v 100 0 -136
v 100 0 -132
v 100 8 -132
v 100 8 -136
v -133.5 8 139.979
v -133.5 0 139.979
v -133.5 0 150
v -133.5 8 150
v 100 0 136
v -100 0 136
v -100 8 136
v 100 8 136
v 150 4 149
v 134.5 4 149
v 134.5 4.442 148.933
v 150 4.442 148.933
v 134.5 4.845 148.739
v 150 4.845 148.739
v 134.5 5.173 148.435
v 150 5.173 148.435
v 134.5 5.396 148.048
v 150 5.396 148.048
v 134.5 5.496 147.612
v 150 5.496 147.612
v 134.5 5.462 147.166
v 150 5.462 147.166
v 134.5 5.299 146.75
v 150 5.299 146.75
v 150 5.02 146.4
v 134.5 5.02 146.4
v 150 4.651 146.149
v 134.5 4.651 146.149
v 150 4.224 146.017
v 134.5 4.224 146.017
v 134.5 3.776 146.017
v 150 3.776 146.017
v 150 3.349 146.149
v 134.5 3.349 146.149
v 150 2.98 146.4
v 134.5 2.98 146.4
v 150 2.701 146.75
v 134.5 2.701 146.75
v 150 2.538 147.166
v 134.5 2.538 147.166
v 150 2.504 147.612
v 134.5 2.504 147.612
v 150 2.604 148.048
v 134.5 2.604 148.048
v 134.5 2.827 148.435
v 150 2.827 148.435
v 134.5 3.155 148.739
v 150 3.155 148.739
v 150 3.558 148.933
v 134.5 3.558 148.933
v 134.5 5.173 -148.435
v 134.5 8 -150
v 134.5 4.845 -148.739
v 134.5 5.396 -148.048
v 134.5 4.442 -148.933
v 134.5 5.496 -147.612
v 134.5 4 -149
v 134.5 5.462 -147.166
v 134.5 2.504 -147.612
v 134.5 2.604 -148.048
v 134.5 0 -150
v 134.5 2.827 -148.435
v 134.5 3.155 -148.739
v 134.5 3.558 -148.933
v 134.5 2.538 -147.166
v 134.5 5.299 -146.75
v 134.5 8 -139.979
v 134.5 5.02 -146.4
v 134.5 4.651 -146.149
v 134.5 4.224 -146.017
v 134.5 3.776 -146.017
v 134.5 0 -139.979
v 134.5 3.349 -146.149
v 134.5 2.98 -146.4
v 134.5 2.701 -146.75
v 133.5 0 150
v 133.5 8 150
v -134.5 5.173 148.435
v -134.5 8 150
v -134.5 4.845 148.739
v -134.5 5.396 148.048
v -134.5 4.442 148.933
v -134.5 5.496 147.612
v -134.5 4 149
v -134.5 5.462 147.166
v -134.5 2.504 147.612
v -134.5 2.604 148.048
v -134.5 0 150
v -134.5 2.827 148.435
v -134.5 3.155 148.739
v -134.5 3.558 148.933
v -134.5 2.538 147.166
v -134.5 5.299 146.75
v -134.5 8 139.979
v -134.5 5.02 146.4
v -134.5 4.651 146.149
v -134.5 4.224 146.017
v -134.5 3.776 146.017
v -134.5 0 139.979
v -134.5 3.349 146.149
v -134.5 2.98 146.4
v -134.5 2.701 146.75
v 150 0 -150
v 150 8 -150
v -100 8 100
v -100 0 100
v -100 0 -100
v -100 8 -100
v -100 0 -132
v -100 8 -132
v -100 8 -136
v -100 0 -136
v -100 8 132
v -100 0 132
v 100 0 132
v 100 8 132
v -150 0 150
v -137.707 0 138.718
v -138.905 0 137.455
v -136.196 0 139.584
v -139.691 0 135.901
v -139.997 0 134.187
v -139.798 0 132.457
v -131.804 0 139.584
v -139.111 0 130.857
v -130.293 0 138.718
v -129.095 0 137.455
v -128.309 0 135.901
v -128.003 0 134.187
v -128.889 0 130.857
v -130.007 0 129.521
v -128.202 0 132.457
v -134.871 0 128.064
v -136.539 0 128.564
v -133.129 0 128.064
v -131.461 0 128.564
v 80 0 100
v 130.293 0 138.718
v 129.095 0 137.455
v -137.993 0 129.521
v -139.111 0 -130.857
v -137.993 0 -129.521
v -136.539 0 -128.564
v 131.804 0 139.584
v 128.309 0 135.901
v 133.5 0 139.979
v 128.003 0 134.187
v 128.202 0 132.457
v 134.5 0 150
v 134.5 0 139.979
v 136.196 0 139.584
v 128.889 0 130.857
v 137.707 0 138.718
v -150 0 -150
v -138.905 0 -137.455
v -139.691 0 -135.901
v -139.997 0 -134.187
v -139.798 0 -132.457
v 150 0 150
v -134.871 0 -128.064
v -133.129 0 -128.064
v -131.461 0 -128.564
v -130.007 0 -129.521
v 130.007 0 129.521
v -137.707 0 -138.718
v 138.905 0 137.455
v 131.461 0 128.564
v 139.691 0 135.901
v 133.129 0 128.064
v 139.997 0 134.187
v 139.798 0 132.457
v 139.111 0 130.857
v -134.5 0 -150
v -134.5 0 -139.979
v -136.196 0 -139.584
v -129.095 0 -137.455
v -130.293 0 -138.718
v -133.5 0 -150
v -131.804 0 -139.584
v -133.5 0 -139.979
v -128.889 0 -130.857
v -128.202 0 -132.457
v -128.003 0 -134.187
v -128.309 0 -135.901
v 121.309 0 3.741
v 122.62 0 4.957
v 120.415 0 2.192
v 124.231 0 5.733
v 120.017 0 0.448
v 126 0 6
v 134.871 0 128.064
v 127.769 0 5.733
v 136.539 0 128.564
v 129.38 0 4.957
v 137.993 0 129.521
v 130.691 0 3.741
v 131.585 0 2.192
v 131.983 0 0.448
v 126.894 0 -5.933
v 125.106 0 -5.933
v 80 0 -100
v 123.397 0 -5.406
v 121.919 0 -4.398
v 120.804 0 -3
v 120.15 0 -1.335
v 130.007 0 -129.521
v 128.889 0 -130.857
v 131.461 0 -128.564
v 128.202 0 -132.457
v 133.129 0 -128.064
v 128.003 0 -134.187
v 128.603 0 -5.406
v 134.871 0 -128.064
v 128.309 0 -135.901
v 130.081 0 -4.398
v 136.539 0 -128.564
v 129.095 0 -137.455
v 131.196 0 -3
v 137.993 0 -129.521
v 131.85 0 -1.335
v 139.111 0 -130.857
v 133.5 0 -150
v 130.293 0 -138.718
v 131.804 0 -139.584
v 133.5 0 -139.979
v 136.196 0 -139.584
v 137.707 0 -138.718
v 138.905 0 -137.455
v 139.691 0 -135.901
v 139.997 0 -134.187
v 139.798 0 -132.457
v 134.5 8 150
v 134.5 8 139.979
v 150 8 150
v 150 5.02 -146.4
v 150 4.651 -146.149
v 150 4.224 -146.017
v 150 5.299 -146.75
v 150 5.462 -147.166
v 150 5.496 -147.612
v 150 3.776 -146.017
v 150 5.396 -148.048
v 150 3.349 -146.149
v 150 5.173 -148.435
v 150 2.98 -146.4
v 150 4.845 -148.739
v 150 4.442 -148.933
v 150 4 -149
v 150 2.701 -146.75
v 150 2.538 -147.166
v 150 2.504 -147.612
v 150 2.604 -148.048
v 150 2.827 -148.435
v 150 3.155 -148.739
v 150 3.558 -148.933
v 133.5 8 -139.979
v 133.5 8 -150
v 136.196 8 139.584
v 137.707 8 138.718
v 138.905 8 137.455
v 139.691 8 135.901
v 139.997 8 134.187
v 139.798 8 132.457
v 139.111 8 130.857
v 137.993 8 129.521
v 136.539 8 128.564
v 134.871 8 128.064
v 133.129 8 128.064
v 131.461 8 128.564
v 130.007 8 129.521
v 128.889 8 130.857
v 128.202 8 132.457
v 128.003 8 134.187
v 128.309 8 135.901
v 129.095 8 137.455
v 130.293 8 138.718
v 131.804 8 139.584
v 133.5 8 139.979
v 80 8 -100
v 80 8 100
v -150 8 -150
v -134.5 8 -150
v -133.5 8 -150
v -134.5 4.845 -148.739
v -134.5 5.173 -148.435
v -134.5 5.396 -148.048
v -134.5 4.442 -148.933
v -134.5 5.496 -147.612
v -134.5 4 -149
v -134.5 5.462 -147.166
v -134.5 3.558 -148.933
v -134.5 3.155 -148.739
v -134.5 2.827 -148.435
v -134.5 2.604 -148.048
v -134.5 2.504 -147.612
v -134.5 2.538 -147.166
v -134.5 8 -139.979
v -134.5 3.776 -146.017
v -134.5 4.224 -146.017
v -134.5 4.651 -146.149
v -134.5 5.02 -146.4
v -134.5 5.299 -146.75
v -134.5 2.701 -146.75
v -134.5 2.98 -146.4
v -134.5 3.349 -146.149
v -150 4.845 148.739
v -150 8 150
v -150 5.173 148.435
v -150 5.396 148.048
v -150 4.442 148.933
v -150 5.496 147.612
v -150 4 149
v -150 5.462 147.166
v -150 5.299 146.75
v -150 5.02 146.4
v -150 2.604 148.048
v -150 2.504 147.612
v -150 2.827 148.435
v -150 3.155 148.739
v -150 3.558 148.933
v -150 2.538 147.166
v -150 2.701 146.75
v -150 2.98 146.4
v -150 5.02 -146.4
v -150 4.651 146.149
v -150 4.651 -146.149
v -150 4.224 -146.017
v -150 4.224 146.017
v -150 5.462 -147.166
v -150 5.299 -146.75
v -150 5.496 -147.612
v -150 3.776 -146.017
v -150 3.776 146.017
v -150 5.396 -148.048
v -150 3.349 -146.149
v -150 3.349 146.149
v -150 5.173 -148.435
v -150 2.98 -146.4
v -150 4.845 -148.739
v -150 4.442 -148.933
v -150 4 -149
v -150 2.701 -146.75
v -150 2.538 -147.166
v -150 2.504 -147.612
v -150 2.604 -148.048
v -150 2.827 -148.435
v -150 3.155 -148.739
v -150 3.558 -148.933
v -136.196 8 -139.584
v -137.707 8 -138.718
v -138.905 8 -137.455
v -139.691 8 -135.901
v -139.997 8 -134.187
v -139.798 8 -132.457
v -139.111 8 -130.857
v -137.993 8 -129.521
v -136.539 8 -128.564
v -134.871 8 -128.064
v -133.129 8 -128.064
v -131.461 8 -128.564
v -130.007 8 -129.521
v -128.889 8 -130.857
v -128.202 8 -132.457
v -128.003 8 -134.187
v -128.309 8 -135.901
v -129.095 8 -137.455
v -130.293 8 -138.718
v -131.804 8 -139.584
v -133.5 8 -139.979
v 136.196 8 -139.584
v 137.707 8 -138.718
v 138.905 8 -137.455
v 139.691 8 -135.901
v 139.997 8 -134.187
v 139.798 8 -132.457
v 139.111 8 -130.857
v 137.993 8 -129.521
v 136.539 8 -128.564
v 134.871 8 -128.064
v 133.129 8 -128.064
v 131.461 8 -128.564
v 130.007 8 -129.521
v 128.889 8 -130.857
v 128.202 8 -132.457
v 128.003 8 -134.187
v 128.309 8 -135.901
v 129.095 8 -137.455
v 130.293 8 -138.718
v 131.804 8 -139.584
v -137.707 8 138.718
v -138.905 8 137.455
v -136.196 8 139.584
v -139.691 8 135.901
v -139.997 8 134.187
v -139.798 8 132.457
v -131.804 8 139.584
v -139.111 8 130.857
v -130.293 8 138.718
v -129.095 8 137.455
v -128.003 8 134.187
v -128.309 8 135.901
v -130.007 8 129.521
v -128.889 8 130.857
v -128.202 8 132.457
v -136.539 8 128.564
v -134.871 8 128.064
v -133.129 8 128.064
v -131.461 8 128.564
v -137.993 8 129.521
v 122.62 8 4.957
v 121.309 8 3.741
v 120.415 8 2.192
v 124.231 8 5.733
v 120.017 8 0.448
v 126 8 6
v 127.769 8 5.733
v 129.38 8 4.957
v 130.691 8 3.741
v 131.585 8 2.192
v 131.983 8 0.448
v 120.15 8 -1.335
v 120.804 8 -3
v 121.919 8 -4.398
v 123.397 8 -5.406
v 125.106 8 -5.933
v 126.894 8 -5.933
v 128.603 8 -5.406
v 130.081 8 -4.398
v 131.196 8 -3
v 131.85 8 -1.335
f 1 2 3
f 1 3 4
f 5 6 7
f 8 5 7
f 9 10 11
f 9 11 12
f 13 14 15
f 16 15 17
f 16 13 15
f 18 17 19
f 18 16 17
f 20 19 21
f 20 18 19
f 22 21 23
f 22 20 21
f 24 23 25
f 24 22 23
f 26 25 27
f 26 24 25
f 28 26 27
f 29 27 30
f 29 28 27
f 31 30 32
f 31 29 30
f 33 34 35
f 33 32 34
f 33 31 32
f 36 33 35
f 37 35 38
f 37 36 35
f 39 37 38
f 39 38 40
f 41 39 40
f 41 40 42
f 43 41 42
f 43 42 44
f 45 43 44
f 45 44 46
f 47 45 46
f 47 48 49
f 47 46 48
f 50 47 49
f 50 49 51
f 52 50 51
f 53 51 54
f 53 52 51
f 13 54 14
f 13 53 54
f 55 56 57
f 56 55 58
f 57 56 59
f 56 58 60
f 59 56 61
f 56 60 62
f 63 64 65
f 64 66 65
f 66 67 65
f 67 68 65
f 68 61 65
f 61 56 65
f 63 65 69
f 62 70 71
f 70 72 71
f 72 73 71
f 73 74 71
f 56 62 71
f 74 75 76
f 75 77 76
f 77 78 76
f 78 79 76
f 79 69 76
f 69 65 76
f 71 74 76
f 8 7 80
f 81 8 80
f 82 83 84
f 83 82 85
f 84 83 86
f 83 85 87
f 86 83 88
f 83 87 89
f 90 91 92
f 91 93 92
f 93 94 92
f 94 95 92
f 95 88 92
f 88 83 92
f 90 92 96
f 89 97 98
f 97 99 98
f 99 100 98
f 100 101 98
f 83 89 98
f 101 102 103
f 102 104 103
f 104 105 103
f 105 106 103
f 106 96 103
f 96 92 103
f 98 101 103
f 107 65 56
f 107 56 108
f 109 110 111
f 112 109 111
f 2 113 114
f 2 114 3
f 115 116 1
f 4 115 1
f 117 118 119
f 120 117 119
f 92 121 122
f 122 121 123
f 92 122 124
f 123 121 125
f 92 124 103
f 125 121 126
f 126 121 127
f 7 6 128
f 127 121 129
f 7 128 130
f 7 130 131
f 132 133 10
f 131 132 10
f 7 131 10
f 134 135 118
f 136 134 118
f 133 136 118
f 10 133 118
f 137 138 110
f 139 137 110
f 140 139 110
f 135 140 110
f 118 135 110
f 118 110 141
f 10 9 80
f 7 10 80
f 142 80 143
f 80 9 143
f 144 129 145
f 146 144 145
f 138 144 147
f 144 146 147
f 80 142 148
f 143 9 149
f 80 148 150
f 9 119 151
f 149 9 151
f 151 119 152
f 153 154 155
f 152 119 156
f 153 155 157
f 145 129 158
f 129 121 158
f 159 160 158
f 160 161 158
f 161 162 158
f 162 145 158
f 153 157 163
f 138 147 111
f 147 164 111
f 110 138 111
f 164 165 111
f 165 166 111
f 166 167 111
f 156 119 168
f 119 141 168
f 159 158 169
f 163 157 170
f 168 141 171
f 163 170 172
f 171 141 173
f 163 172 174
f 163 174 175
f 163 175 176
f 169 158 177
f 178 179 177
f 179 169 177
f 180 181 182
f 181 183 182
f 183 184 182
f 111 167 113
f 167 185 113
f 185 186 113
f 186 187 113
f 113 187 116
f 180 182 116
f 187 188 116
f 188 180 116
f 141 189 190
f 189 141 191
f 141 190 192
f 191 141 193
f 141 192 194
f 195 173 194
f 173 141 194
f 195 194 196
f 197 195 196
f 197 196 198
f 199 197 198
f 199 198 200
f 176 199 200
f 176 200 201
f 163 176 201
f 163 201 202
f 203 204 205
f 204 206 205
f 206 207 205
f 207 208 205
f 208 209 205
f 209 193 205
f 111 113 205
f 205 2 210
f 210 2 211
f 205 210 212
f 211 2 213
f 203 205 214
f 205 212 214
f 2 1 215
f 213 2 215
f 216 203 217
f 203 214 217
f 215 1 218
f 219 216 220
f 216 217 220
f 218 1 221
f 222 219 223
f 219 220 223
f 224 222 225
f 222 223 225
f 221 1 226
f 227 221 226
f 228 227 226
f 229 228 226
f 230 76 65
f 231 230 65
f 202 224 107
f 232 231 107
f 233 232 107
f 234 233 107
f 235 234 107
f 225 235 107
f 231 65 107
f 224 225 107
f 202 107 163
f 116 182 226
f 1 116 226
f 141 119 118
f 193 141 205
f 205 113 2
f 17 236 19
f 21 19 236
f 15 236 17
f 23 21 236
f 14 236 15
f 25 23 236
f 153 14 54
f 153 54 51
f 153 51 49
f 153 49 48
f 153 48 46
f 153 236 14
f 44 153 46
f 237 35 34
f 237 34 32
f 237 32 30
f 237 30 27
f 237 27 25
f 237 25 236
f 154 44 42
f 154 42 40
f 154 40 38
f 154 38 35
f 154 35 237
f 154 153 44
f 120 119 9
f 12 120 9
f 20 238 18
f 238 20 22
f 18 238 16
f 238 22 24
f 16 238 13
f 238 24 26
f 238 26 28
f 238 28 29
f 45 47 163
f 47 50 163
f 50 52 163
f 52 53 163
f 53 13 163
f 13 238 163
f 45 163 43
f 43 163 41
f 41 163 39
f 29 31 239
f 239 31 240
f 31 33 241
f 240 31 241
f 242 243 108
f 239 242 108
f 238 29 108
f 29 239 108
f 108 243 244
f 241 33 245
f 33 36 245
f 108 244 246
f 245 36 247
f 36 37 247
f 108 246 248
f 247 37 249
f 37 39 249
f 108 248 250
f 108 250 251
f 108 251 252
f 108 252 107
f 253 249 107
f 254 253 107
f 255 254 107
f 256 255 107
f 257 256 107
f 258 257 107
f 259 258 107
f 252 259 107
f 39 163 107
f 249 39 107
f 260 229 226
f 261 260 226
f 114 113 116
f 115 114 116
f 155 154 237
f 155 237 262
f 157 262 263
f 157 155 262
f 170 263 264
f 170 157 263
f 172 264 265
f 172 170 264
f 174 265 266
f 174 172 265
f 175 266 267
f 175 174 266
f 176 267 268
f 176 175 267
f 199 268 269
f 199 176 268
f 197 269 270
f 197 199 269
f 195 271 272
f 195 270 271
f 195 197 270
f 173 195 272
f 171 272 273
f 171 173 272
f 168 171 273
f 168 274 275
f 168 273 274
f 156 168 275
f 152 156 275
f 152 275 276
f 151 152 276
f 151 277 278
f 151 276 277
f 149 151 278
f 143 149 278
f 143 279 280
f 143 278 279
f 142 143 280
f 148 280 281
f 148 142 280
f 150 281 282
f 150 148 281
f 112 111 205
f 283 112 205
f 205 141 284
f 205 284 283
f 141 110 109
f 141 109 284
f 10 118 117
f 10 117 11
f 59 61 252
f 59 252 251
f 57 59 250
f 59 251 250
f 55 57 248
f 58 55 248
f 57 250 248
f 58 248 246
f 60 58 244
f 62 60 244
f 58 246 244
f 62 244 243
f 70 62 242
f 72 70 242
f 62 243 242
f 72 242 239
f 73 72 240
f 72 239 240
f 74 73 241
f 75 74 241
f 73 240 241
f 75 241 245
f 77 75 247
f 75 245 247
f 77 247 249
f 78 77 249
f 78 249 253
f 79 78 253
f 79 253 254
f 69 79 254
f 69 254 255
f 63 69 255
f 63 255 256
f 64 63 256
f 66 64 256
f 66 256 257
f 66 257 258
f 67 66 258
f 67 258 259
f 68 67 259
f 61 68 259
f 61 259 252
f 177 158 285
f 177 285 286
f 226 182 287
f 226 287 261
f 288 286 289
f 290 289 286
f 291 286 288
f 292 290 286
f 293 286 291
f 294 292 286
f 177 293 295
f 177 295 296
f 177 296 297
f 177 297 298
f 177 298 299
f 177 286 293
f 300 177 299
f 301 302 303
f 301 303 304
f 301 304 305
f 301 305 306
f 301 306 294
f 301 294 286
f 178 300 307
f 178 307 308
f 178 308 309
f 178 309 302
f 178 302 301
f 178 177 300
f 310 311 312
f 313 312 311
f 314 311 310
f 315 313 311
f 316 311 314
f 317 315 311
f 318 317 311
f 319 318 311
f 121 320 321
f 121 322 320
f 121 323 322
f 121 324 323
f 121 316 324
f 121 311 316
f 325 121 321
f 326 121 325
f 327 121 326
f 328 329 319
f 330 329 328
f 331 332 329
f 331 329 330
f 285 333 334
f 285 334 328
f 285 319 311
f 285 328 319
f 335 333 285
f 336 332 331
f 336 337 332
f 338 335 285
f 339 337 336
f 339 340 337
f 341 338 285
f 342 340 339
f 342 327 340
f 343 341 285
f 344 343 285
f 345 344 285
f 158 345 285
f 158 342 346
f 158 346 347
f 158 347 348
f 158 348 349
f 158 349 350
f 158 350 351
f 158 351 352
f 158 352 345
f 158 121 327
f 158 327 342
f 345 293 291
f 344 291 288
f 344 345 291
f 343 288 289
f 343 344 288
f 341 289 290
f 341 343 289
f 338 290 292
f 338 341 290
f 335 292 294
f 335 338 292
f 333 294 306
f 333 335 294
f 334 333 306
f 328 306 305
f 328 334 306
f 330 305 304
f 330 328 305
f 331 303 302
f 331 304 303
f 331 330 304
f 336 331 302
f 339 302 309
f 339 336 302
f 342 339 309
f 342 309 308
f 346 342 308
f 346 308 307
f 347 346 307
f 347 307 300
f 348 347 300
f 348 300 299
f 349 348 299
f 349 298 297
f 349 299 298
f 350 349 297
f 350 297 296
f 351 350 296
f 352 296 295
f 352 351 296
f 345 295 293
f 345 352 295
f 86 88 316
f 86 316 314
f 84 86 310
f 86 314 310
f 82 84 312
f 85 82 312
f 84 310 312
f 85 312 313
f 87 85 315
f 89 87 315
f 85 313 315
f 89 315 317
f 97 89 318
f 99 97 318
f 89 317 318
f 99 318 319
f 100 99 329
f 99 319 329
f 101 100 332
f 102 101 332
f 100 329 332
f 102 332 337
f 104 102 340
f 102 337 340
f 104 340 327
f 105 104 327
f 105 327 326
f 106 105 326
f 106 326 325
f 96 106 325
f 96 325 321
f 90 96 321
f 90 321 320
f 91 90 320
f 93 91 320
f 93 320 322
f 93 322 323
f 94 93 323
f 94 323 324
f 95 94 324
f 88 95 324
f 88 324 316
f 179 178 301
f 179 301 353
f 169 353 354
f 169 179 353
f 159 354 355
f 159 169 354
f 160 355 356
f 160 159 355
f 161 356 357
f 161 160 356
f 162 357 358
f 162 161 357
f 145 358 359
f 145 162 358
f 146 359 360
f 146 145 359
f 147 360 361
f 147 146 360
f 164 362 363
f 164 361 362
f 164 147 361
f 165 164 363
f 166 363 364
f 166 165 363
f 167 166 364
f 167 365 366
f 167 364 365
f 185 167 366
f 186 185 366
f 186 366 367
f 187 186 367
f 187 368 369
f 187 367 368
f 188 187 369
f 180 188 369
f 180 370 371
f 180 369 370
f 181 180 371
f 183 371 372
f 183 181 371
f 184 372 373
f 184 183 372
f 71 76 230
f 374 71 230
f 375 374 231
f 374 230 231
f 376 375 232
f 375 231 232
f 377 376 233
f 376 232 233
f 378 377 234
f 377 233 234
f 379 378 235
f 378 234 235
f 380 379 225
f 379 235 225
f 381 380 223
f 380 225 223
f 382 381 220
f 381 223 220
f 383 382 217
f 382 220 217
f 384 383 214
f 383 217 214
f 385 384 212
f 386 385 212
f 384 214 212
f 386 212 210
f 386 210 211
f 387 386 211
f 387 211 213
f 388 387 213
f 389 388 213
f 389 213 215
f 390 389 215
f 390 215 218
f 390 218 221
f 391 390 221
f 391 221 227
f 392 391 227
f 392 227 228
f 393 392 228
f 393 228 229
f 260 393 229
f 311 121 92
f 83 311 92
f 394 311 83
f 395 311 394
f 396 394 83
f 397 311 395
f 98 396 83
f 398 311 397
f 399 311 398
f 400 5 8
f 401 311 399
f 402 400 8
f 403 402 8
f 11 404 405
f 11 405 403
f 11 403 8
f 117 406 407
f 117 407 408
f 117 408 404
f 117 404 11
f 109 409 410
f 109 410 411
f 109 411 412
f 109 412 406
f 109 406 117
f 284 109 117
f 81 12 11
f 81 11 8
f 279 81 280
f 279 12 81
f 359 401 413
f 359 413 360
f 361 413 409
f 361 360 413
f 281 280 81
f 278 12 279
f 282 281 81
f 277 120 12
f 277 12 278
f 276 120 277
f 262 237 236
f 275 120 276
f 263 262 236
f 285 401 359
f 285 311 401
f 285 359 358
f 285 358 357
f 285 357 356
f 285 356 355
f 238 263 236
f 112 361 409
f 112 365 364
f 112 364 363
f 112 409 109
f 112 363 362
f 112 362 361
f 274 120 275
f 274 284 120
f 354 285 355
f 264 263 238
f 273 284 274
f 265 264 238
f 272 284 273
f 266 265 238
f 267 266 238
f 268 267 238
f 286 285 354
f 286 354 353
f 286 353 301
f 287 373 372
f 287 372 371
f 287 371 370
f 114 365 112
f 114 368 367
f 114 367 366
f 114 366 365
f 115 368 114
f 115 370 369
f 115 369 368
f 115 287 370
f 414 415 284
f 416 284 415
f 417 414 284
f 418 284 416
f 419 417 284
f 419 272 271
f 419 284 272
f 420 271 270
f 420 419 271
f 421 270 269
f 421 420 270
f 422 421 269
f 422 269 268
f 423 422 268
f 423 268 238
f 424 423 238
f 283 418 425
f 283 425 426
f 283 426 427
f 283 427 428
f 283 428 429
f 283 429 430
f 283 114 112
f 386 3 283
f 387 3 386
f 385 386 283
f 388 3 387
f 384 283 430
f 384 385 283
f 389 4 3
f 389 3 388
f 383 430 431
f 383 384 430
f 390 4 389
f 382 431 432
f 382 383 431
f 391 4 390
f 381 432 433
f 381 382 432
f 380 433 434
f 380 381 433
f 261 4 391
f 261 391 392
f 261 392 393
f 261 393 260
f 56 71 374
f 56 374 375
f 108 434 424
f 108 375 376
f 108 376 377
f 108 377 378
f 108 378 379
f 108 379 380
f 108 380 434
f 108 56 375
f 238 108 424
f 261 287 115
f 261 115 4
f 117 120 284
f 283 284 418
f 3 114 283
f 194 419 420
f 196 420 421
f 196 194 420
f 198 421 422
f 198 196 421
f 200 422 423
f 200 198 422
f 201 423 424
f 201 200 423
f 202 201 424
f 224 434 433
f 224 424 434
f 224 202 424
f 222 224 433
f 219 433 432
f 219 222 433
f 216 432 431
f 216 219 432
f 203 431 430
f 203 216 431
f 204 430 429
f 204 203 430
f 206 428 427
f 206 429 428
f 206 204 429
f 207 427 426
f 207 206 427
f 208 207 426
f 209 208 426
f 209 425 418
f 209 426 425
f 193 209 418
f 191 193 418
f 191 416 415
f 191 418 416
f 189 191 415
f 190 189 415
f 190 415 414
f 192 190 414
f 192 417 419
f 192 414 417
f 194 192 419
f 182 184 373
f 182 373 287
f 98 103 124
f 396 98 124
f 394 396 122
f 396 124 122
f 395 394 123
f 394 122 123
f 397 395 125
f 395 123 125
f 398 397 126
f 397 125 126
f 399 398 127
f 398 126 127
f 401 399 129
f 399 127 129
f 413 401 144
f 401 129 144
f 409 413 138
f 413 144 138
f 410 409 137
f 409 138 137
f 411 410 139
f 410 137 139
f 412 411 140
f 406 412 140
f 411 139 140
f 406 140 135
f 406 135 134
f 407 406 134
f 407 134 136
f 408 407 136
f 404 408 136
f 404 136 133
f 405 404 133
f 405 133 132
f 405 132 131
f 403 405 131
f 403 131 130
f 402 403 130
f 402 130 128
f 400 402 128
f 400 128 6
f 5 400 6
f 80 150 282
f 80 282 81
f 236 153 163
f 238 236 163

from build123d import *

# Parameters (mm, degrees)
SKETCH1_W               = 300
SKETCH1_H               = 300
SKETCH1_W_2             = 180
SKETCH1_H_2             = 200
BOSS_EXTRUDE1_DEPTH     = 8
CUT_EXTRUDE1_DEPTH      = 213.282830205
SKETCH3_R               = 1.5
CUT_EXTRUDE2_DEPTH      = 16.5
SKETCH4_R               = 6
CUT_EXTRUDE4_DEPTH      = 213.282830205
MIRROR4_COPY_1_DEPTH    = 213.282830205
MIRROR4_COPY_2_SKETCH_R = 1.5
MIRROR4_COPY_2_DEPTH    = 16.5
SKETCH5_W               = 200
SKETCH5_H               = 4
CUT_EXTRUDE5_DEPTH      = 213.282830205


with BuildPart() as part:
    # Sketch1 → Boss-Extrude1 (new body)
    with BuildSketch(Plane(origin=(0, 0, 0), x_dir=(1, 0, 0), z_dir=(0, 1, 0))):
        Rectangle(SKETCH1_W, SKETCH1_H)
        with Locations((-10, 0)):
            Rectangle(SKETCH1_W_2, SKETCH1_H_2, mode=Mode.SUBTRACT)
    extrude(amount=BOSS_EXTRUDE1_DEPTH)

    # Sketch2 → Cut-Extrude1 (cut, through all)
    with BuildSketch(Plane(origin=(0, 0, 0), x_dir=(1, 0, 0), z_dir=(0, 1, 0))):
        with BuildLine():
            Line((133.5, 150), (134.5, 150))
            Line((134.5, 150), (134.5, 139.979130372))
            ThreePointArc((134.5, 139.979130372), (134, 128), (133.5, 139.979130372))
            Line((133.5, 139.979130372), (133.5, 150))
        make_face()
    cut_extrude1 = extrude(amount=CUT_EXTRUDE1_DEPTH, mode=Mode.SUBTRACT)

    # Sketch3 → Cut-Extrude2 (cut)
    with BuildSketch(Plane(origin=(150, 0, 0), x_dir=(0, 0, -1), z_dir=(1, 0, 0))):
        with Locations((147.5, 4)):
            Circle(SKETCH3_R)
    cut_extrude2 = extrude(amount=-CUT_EXTRUDE2_DEPTH, mode=Mode.SUBTRACT)

    # Mirror3: Cut-Extrude1, Cut-Extrude2 across plane
    add(cut_extrude1.mirror(Plane.XY), mode=Mode.SUBTRACT)
    add(cut_extrude2.mirror(Plane.XY), mode=Mode.SUBTRACT)

    # Sketch4 → Cut-Extrude4 (cut, through all)
    with BuildSketch(Plane(origin=(0, 0, 0), x_dir=(1, 0, 0), z_dir=(0, 1, 0))):
        with Locations(Location((126, 0, 0), (0, 0, 270))):
            Circle(SKETCH4_R)
    extrude(amount=CUT_EXTRUDE4_DEPTH, mode=Mode.SUBTRACT)

    # Mirror4: Cut-Extrude1, Cut-Extrude2 across plane
    add(cut_extrude1.mirror(Plane(origin=(0, 0, 0), x_dir=(0, 0, 1), z_dir=(1, 0, 0))), mode=Mode.SUBTRACT)
    add(cut_extrude2.mirror(Plane(origin=(0, 0, 0), x_dir=(0, 0, 1), z_dir=(1, 0, 0))), mode=Mode.SUBTRACT)

    # Mirror4 copy 1 sketch → Mirror4 copy 1 (cut, through all)
    with BuildSketch(Plane(origin=(0, 0, 0), x_dir=(-1, 0, 0), z_dir=(0, 1, 0))):
        with BuildLine():
            Line((133.5, 150), (134.5, 150))
            Line((134.5, 150), (134.5, 139.979130372))
            ThreePointArc((134.5, 139.979130372), (134, 128), (133.5, 139.979130372))
            Line((133.5, 139.979130372), (133.5, 150))
        make_face()
    extrude(amount=MIRROR4_COPY_1_DEPTH, mode=Mode.SUBTRACT)

    # Mirror4 copy 2 sketch → Mirror4 copy 2 (cut)
    with BuildSketch(Plane.ZY.offset(150)):
        with Locations((147.5, 4)):
            Circle(MIRROR4_COPY_2_SKETCH_R)
    extrude(amount=-MIRROR4_COPY_2_DEPTH, mode=Mode.SUBTRACT)

    # Sketch5 → Cut-Extrude5 (cut, through all)
    with BuildSketch(Plane(origin=(0, 0, 0), x_dir=(1, 0, 0), z_dir=(0, 1, 0))):
        with Locations((0, 134)):
            Rectangle(SKETCH5_W, SKETCH5_H)
    cut_extrude5 = extrude(amount=CUT_EXTRUDE5_DEPTH, mode=Mode.SUBTRACT)

    # Mirror5: Cut-Extrude5 across plane
    add(cut_extrude5.mirror(Plane.XY), mode=Mode.SUBTRACT)


solid = part.part
